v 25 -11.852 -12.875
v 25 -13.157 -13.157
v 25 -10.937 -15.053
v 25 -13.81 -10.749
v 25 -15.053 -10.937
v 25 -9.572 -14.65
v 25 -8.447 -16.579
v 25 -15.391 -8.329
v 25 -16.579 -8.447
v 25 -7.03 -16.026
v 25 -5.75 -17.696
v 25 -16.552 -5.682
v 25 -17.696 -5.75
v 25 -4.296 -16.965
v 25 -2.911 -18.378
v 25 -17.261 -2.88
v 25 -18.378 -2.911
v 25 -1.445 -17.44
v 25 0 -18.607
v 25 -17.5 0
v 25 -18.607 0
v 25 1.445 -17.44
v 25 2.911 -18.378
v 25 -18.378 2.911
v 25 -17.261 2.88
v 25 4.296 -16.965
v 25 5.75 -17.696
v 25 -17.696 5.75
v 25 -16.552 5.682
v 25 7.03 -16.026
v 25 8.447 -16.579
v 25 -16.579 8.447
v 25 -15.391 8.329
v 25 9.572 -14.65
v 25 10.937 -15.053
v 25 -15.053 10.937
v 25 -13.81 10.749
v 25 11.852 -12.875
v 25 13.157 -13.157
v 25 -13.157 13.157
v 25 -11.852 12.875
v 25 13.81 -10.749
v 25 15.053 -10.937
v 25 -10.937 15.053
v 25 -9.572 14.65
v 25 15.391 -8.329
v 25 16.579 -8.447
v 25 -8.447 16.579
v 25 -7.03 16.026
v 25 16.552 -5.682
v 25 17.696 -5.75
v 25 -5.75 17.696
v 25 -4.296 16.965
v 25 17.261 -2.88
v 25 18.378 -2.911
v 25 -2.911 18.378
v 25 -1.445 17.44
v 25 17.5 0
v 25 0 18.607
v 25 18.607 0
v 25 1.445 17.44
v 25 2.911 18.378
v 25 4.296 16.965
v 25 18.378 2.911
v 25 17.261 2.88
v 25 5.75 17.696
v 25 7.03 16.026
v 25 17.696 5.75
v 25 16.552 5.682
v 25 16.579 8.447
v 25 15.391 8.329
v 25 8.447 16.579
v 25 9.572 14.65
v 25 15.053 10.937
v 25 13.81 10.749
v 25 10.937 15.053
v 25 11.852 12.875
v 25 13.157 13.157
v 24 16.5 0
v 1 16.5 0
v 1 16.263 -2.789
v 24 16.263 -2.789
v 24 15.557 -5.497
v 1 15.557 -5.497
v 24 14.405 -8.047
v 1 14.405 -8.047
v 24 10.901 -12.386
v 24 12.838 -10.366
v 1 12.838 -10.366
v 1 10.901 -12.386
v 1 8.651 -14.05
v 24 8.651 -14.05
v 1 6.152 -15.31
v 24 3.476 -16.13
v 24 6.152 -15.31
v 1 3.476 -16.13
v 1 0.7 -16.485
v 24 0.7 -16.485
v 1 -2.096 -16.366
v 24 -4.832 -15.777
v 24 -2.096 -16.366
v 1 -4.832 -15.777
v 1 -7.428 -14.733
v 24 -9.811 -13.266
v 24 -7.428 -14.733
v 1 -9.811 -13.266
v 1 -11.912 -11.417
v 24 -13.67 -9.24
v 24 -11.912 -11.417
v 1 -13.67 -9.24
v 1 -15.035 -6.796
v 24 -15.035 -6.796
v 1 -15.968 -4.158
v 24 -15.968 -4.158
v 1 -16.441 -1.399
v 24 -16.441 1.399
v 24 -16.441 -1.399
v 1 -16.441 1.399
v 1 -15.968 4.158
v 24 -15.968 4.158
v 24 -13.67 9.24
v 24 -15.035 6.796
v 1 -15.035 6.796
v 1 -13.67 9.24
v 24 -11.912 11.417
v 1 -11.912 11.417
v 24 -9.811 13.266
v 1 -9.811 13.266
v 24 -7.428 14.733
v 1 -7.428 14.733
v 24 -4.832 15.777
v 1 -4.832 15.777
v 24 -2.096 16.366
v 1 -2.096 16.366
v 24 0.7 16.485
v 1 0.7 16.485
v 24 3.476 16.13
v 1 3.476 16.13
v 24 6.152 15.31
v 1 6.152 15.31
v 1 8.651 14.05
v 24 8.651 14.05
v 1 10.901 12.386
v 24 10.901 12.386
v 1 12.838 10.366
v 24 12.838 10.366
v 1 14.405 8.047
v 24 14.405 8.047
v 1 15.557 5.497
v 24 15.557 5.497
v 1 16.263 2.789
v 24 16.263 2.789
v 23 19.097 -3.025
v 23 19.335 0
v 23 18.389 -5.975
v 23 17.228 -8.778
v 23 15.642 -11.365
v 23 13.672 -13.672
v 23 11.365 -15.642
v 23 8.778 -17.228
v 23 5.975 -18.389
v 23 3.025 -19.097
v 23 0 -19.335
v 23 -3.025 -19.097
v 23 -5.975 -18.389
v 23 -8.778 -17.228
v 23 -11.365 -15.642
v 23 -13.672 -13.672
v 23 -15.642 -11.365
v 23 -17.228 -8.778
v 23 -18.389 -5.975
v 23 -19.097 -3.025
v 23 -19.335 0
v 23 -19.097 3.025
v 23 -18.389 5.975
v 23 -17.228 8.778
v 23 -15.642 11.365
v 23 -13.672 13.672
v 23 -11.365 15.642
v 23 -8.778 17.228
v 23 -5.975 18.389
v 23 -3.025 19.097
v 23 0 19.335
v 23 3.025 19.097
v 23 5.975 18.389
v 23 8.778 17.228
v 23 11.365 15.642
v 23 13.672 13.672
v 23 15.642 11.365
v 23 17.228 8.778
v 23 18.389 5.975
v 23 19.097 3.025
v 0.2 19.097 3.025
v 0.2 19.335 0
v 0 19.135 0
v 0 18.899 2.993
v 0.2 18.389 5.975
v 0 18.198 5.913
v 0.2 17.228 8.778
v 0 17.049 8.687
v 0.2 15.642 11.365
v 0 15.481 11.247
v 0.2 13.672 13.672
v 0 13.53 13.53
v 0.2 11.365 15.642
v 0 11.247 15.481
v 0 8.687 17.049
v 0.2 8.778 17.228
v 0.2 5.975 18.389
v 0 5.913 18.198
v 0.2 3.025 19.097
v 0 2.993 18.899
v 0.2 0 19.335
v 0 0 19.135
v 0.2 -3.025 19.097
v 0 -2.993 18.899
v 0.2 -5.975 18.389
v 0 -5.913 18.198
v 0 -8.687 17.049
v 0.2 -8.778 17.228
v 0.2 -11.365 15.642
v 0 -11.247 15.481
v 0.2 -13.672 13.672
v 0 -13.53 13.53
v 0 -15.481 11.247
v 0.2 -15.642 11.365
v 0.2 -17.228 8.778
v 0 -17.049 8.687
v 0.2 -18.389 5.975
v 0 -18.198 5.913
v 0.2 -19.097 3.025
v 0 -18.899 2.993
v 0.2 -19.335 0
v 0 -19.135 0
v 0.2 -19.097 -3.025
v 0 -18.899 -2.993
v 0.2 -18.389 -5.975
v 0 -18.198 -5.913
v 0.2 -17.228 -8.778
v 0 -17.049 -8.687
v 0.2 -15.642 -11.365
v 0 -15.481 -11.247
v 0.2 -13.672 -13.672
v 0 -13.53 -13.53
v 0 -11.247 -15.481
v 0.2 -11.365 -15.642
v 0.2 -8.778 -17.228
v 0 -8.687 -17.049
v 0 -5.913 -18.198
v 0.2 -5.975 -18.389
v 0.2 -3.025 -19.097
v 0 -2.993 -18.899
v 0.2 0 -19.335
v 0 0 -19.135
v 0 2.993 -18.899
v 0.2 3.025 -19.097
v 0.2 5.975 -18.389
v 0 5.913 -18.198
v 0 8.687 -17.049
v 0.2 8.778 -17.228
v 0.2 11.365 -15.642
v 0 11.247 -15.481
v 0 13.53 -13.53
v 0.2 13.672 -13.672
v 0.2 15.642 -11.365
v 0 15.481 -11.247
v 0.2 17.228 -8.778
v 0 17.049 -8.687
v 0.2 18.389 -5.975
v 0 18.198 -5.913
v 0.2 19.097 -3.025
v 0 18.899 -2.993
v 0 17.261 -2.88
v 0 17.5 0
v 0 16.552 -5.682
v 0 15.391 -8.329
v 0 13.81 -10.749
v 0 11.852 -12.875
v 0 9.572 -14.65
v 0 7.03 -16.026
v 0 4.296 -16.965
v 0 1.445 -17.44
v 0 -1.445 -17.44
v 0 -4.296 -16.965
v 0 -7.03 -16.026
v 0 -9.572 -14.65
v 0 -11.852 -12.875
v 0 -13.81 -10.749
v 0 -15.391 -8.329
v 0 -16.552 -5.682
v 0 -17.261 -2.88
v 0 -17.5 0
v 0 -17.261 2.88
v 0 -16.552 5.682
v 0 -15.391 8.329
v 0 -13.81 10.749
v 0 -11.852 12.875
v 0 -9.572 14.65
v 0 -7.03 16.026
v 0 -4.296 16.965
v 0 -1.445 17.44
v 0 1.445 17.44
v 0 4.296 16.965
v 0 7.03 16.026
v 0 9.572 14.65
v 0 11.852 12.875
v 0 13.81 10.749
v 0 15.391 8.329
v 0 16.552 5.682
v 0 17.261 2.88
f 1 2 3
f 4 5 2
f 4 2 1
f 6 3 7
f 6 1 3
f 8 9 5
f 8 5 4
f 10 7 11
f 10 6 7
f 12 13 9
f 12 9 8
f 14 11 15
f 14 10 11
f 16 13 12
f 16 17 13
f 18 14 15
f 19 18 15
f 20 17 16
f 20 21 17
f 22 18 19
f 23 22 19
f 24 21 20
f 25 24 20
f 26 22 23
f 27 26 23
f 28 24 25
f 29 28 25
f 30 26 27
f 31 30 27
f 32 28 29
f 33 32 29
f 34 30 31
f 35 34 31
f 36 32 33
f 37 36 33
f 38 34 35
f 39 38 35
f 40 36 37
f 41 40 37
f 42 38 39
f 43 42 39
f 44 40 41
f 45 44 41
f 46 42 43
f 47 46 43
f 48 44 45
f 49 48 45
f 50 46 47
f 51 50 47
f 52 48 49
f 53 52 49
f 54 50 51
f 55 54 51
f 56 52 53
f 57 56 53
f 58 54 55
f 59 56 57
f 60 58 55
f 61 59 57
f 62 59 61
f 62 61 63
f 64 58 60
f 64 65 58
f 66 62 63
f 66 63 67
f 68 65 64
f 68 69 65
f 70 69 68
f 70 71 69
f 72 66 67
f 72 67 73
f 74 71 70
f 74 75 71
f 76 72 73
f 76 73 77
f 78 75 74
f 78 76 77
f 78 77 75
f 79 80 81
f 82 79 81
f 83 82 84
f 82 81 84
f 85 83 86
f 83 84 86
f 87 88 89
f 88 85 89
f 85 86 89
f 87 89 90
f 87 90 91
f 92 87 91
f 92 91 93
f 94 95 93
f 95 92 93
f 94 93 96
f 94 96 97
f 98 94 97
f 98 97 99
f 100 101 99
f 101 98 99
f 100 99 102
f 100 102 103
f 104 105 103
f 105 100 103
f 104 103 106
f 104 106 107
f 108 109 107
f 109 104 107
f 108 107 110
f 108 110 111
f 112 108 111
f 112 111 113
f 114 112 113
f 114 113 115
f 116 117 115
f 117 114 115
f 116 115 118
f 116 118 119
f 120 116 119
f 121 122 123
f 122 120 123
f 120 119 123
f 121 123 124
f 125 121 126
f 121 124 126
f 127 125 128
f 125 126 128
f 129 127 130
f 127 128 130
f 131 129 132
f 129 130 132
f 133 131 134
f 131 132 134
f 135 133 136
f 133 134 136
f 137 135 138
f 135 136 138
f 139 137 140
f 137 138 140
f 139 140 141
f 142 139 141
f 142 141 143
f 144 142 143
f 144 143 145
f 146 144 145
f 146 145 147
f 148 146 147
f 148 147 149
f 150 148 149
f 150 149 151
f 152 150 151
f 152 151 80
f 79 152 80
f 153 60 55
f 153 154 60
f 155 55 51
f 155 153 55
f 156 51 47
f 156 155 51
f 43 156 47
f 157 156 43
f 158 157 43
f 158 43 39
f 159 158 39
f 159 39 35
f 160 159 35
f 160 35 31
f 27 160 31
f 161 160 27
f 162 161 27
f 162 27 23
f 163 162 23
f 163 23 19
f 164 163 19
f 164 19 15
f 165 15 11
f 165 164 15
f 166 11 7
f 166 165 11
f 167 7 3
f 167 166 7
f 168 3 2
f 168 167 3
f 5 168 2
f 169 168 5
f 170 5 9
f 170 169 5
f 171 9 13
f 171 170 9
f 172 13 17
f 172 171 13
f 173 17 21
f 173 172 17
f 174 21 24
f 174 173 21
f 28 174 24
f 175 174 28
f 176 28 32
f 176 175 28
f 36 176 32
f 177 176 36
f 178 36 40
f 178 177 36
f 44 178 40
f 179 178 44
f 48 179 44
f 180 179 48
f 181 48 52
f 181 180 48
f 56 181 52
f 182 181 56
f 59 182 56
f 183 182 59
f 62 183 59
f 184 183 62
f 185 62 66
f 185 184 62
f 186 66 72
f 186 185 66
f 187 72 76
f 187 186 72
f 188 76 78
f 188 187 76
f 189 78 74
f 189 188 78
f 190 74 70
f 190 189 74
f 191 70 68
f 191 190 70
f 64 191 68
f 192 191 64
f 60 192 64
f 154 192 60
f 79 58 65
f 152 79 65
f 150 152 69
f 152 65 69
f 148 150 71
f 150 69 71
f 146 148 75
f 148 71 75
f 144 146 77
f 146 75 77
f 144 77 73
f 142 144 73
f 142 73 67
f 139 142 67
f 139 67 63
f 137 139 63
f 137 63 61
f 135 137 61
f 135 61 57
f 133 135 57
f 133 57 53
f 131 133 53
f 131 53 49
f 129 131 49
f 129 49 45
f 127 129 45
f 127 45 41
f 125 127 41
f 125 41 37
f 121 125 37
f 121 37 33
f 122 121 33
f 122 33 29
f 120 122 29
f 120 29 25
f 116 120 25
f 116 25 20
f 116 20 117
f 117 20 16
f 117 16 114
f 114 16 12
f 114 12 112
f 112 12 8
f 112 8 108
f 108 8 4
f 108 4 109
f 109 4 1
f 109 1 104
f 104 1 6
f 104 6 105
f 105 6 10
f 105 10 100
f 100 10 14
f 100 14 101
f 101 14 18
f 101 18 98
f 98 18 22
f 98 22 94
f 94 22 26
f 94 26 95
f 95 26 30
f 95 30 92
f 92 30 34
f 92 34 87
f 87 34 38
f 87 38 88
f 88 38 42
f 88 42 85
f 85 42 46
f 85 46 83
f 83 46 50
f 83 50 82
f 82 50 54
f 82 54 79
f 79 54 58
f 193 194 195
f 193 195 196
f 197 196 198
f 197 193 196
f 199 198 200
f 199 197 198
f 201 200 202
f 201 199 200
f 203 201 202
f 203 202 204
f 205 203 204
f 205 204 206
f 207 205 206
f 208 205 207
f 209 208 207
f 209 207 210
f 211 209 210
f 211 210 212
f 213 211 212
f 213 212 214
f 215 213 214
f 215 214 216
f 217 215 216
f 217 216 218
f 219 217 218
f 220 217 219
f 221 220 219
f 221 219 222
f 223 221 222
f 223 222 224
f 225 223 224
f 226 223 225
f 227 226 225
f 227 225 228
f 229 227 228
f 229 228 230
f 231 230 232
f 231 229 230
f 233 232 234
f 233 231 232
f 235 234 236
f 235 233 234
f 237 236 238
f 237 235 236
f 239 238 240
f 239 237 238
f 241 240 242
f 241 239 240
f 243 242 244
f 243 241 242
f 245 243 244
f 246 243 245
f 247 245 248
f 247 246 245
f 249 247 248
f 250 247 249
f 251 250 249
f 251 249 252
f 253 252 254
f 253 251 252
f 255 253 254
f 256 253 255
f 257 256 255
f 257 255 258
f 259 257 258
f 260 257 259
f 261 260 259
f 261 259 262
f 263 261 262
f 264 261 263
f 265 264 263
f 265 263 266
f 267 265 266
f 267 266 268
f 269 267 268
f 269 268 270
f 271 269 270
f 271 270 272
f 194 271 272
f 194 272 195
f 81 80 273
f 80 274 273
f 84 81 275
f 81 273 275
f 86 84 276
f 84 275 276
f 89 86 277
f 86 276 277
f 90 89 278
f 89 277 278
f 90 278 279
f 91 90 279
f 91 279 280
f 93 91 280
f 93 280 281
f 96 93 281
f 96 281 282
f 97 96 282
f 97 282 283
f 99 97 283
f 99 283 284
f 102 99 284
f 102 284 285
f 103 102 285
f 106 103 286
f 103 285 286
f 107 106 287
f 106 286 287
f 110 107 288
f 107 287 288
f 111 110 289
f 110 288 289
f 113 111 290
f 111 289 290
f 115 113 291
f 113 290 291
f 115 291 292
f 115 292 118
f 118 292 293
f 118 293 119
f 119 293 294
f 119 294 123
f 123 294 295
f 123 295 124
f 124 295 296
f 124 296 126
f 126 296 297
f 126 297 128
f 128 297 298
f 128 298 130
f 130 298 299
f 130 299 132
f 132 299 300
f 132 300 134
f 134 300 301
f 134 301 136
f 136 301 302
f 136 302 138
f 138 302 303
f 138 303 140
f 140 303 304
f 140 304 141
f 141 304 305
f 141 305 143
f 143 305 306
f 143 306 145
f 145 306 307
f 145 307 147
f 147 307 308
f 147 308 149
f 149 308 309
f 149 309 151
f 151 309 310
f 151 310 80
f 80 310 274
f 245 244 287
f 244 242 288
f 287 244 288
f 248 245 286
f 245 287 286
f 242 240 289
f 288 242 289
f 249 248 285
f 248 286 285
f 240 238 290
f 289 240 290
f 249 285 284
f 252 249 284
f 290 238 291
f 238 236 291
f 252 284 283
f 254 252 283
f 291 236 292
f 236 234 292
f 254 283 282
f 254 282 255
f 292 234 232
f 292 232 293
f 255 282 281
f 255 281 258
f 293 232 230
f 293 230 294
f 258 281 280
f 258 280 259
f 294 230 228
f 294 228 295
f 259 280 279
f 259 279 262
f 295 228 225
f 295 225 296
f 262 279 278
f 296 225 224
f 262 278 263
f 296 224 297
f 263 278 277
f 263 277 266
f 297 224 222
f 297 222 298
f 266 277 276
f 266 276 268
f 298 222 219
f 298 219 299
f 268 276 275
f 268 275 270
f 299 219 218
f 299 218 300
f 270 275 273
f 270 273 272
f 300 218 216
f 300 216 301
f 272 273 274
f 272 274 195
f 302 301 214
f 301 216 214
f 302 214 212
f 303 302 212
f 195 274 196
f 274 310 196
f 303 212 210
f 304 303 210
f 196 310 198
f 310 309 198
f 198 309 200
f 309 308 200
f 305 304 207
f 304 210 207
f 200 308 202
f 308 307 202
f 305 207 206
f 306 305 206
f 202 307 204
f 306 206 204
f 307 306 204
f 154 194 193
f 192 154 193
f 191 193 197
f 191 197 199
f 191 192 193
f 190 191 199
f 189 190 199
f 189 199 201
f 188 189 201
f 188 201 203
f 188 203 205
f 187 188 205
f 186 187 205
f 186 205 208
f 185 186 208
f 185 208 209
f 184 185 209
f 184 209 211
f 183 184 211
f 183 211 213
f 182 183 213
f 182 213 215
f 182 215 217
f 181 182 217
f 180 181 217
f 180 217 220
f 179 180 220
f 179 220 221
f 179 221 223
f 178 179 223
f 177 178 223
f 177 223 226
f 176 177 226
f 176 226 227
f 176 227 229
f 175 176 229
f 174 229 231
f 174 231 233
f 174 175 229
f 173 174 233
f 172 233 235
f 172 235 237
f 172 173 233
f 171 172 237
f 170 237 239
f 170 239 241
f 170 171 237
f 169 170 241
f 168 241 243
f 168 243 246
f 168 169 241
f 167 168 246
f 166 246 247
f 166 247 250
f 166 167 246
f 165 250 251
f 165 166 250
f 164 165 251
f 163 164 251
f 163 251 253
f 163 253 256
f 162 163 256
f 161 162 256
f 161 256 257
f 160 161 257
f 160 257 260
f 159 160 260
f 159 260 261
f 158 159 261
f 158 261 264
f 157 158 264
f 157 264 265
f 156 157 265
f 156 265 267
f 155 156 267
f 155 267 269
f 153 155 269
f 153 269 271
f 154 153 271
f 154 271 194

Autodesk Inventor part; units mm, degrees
ref_plane "YZ Plane" through (0, 0, 0) normal (1, 0, 0) x (0, 1, 0)
ref_plane "XZ Plane" through (0, 0, 0) normal (0, 1, 0) x (-1, 0, 0)
ref_plane "XY Plane" through (0, 0, 0) normal (0, 0, 1) x (1, 0, 0)
sketch "Náčrt1" plane through (0, 0, 0) normal (0, 0, 1) x (1, 0, 0)
  line L0 (0, 0) -> (33.3333, 0)
  line L1 (0, 19.335) -> (25, 19.335)
  line L2 (25, 19.335) -> (25, 16.5)
  line L3 (25, 16.5) -> (0, 16.5)
  line L4 (0, 16.5) -> (0, 19.335)
  dimension "d0" = 25
  dimension "d6" = 38.67
  dimension "d7" = 33
revolve "Rotace1" add sketch "Náčrt1" angle 360 about axis through (0, 0, 0) along (1, 0, 0)
chamfer "Zkosení1" distance 1 angle 45 2 edges at (25, -16.5, 0) (0, -16.5, 0)
chamfer "Zkosení2" distance 0.2 angle 45 1 edges at (0, -19.335, 0)
chamfer "Zkosení4" distance 2 angle 20 1 edges at (25, -19.335, 0) measured on face at (16.7333, 19.2723, -1.5558)
equation "\"Rozmer_A\" = d6"
equation "\"Rozmer_B\" = 0"
equation "\"Rozmer_C\" = 0"
equation "\"Rozmer_D\" = d0"
properties part number "NA-45-h-Crown-157" material "19 573.4"
